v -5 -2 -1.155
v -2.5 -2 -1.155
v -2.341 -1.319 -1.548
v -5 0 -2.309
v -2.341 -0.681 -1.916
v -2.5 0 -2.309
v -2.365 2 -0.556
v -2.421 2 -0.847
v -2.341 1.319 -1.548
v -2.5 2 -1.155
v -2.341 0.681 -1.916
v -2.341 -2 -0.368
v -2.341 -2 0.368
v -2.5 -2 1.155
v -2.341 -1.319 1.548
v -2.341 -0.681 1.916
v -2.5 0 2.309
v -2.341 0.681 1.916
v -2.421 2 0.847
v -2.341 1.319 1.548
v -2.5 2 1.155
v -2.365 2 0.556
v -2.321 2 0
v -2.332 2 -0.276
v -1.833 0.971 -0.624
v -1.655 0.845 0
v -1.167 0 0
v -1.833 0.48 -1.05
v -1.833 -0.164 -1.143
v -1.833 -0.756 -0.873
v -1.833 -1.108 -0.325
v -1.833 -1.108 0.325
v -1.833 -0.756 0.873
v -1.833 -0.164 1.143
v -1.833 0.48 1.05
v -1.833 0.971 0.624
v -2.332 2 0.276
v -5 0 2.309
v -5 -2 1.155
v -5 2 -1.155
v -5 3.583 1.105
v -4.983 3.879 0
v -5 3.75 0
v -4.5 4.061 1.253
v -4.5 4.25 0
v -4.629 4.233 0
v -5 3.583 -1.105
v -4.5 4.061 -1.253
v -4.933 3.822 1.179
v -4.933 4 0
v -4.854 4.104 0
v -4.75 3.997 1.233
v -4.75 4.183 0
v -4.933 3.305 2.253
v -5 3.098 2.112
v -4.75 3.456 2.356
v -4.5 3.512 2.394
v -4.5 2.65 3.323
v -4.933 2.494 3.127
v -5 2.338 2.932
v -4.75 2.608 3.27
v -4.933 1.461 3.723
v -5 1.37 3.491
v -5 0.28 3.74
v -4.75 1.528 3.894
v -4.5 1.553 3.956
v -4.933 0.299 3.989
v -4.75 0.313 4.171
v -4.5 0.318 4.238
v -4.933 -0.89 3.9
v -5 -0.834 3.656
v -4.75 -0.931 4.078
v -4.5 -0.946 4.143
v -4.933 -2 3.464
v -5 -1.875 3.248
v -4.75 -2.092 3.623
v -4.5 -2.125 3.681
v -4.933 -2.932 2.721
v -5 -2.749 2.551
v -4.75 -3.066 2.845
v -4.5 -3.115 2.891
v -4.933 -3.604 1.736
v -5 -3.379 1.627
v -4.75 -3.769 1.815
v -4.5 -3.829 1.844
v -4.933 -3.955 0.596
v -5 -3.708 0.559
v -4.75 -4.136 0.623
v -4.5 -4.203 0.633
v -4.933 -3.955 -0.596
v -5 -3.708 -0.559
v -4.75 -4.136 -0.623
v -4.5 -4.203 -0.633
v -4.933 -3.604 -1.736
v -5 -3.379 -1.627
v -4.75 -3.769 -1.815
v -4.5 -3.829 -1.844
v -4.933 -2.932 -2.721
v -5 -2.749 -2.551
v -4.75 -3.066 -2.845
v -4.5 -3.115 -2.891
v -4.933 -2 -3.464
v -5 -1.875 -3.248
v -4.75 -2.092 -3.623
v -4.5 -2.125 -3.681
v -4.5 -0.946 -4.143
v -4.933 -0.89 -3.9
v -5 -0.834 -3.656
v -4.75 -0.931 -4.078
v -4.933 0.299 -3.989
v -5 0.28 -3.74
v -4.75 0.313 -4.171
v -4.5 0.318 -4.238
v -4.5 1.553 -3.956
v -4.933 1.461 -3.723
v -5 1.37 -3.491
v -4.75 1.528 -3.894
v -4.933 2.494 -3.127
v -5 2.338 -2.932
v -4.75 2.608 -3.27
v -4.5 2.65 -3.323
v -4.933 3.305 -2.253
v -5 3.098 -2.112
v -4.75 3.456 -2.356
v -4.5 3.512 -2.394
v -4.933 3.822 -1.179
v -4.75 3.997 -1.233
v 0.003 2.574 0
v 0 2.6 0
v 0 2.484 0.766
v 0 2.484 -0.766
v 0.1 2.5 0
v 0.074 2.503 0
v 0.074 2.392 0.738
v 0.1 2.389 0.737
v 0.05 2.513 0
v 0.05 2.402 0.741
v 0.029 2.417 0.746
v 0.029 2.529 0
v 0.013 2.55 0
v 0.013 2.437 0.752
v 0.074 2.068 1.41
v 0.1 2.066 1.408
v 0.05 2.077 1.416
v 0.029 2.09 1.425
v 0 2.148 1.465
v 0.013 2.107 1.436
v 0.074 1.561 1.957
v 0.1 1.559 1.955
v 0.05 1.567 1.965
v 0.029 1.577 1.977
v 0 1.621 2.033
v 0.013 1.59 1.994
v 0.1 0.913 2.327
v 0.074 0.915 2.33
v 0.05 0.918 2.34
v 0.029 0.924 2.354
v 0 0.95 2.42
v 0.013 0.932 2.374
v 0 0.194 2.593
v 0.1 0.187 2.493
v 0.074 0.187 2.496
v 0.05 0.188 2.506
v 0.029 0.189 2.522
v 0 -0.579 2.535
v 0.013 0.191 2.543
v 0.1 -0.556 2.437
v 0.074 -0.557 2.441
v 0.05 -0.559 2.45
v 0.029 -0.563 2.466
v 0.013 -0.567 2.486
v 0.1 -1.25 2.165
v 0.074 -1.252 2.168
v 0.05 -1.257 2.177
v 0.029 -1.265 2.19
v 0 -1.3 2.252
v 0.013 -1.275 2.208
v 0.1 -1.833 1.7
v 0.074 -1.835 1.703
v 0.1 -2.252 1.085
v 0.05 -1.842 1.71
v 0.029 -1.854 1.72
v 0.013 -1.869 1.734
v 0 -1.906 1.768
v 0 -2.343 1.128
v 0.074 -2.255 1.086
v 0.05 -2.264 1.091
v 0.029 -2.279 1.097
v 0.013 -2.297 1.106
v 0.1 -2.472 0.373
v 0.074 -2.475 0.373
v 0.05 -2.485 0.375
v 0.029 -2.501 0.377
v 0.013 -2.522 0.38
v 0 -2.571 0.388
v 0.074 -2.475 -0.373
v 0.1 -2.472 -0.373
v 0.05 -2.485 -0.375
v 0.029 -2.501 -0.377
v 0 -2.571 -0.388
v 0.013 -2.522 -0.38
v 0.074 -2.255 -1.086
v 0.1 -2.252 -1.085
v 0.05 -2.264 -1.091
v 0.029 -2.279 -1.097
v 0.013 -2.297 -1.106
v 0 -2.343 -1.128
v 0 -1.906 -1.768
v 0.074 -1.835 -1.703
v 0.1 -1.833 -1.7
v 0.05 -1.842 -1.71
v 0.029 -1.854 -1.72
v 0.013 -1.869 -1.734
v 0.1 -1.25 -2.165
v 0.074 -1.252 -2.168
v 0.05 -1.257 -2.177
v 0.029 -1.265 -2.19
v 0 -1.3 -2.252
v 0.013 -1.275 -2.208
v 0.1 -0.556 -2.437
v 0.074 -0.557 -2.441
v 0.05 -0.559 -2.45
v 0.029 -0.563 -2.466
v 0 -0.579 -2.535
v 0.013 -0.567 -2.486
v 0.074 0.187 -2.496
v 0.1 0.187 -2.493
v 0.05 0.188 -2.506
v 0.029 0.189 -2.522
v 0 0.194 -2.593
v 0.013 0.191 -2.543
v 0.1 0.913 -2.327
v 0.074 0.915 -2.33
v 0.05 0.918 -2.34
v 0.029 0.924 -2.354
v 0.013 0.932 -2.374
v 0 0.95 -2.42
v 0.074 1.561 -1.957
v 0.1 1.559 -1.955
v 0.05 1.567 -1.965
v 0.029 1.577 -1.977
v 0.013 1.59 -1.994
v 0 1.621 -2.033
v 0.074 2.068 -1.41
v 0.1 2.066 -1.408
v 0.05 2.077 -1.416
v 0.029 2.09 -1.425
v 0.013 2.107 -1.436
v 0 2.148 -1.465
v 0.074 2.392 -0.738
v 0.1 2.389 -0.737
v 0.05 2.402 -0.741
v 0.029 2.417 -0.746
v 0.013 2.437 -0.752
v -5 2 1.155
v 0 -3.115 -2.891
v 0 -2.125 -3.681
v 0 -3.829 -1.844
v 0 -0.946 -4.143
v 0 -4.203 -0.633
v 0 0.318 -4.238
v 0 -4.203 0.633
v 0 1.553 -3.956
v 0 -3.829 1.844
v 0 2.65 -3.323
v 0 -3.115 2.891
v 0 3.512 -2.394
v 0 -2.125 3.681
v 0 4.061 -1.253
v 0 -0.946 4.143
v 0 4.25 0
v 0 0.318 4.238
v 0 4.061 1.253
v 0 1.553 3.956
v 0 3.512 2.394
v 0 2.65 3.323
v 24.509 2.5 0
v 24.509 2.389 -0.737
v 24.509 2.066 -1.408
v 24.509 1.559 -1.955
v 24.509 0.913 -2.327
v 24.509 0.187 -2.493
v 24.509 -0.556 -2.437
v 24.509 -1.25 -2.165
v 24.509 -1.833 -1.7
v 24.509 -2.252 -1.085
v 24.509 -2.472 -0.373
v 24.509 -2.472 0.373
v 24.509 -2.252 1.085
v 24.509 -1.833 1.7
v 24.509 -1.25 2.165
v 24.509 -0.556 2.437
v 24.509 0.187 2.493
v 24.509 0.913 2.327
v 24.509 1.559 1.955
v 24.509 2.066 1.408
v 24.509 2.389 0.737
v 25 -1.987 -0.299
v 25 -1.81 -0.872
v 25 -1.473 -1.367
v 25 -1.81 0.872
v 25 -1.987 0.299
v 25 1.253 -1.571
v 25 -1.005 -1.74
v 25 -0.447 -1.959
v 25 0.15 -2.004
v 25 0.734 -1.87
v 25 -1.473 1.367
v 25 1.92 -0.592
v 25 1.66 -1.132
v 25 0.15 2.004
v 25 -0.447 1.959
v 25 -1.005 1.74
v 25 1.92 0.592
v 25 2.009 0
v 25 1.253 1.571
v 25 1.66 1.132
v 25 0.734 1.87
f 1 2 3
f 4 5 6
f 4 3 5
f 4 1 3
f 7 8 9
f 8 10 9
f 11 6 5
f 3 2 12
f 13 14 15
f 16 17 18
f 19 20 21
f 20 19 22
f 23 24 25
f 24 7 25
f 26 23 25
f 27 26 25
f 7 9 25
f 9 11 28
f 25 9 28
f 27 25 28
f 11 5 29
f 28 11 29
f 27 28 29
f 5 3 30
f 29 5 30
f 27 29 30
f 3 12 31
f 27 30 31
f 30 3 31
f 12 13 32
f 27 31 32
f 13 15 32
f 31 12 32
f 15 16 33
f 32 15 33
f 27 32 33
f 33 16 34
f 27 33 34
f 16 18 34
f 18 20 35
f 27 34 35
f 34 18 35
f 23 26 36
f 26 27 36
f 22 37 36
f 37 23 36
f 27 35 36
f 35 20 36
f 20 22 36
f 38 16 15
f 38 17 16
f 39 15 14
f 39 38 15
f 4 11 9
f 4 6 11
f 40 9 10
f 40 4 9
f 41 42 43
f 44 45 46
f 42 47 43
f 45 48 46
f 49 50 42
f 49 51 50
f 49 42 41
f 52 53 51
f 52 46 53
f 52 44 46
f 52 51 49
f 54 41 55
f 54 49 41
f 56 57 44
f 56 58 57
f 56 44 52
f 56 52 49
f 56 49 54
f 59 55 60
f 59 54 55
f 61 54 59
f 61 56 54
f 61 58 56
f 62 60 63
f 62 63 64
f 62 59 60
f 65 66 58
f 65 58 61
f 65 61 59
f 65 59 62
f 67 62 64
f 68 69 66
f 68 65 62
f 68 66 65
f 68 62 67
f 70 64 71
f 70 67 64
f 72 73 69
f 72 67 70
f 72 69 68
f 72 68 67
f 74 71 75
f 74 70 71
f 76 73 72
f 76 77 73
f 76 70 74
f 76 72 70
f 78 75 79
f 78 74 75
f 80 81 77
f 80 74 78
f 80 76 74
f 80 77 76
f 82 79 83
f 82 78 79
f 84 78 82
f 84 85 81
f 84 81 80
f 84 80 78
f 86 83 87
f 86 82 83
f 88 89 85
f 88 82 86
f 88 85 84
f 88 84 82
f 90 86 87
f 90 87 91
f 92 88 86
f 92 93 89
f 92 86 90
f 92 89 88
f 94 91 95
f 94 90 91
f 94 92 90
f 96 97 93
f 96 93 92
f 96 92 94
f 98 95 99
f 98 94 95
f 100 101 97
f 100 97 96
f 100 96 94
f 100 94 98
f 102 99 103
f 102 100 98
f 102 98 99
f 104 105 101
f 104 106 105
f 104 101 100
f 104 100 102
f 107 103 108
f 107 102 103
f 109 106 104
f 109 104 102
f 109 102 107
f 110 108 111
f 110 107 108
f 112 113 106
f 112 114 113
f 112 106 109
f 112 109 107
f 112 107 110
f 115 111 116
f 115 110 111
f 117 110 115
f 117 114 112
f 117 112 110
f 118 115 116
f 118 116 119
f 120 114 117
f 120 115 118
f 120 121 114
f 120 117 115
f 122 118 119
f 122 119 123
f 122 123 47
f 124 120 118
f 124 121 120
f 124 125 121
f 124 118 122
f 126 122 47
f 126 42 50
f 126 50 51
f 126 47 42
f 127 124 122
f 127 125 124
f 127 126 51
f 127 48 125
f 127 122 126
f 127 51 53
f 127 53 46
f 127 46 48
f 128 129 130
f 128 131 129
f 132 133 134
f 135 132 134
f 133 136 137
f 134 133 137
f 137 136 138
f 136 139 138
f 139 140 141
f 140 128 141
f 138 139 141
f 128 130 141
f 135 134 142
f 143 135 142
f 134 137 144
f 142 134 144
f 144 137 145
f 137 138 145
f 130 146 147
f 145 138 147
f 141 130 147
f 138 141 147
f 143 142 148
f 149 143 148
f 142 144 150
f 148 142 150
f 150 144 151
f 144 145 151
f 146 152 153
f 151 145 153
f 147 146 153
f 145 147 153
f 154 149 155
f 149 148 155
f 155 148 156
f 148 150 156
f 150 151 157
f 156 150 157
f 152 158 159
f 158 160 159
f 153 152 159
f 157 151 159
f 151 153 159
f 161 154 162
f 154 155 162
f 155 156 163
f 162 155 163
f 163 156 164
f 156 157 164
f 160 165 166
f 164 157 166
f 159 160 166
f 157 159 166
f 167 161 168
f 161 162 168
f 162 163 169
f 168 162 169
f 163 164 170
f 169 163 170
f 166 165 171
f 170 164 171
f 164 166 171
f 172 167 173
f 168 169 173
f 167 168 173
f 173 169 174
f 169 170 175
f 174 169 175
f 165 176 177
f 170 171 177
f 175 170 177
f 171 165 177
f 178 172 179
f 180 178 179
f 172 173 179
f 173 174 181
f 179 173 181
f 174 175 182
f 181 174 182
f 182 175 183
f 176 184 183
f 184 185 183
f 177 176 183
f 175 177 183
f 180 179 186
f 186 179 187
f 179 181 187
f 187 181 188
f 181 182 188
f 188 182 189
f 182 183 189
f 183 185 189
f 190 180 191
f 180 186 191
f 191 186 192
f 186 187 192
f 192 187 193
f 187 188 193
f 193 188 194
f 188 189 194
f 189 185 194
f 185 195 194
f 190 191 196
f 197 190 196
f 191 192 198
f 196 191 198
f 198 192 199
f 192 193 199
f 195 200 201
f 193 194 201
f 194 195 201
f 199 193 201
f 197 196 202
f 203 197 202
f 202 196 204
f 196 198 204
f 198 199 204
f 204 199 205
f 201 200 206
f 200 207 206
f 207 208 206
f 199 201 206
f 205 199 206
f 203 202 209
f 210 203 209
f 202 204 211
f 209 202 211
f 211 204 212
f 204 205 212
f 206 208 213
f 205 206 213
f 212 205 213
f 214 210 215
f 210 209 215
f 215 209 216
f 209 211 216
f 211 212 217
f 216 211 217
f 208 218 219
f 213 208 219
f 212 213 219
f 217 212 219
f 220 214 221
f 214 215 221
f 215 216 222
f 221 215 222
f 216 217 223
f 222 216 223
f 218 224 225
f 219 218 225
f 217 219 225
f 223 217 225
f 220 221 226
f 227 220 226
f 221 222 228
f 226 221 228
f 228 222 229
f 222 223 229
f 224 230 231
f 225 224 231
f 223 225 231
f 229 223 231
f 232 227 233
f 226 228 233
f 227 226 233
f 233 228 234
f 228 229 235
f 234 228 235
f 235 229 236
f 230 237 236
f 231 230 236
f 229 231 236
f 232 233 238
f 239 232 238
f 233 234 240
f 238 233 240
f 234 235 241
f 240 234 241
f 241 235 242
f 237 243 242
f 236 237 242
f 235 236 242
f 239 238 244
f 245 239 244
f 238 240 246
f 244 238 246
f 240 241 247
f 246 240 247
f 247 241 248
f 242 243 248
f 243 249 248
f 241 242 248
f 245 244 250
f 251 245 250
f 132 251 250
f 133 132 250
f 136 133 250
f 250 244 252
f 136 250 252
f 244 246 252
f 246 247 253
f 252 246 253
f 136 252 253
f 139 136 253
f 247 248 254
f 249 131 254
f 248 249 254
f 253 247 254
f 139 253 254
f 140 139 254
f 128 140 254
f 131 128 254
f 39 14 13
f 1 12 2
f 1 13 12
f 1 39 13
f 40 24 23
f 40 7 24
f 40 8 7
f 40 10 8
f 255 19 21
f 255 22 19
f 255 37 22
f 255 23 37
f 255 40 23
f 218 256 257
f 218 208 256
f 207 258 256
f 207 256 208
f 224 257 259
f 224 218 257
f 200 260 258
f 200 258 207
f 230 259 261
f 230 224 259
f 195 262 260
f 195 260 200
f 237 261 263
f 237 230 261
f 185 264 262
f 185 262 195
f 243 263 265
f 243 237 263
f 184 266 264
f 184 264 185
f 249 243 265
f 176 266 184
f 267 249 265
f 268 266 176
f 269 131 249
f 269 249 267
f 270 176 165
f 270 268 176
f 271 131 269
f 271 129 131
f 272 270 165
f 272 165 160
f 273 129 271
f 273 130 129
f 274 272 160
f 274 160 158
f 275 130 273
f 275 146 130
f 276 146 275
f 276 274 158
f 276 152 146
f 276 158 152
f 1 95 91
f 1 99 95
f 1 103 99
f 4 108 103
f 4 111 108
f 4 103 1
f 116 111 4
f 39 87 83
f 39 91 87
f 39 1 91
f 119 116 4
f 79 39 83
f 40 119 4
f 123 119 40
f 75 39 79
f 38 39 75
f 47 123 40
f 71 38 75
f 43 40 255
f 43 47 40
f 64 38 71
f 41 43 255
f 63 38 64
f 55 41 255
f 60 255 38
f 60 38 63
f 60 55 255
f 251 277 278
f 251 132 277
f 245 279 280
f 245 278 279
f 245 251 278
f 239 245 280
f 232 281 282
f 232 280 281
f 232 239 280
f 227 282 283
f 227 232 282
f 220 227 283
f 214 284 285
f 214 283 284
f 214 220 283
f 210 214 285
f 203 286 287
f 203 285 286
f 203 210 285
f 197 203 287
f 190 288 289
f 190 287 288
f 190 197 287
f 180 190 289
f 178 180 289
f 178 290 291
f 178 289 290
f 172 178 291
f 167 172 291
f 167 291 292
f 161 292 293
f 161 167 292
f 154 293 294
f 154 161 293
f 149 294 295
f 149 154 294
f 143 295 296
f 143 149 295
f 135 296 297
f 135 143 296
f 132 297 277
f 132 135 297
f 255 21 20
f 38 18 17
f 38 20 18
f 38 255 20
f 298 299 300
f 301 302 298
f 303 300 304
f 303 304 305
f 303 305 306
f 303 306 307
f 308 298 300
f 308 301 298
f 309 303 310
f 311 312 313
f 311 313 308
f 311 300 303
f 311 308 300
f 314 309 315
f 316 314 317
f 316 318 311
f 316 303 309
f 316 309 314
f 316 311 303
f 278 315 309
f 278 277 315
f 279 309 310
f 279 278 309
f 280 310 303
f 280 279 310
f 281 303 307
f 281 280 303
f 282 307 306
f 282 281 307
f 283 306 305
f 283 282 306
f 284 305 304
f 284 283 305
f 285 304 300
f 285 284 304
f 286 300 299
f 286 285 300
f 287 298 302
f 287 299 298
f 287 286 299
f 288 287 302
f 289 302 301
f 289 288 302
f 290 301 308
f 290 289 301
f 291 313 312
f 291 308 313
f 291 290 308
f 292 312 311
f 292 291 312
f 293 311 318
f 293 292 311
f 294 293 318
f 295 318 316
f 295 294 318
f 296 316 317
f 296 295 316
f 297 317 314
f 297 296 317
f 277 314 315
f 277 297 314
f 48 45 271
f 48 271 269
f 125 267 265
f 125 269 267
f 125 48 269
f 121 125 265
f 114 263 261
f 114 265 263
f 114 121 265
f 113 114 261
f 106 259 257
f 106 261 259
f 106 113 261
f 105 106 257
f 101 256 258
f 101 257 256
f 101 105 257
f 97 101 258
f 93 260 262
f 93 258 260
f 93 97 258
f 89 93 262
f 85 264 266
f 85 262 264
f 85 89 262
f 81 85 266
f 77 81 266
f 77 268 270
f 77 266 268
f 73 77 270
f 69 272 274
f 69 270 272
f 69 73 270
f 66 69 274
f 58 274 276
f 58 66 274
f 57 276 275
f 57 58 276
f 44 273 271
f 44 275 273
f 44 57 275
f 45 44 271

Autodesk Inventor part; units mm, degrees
ref_plane "YZ Plane" through (0, 0, 0) normal (1, 0, 0) x (0, 1, 0)
ref_plane "XZ Plane" through (0, 0, 0) normal (0, 1, 0) x (-1, 0, 0)
sketch "Sketch1" plane through (0, 0, 0) normal (0, 0, 1) x (1, 0, 0)
  line L0 (-1.1667, 0) -> (25, 0)
  line L1 (25, 0) -> (25, 2.5)
  line L2 (25, 2.5) -> (1.4815, 2.5)
  line L3 (1.4815, 2.5) -> (0.9907, 2.5)
  line L4 (0.9907, 2.5) -> (0, 2.5)
  line L5 (0, 2.5) -> (0, 4.25)
  line L6 (0, 4.25) -> (-5, 4.25)
  line L7 (-5, 4.25) -> (-5, 2.3094)
  line L8 (-5, 2.3094) -> (-2.5, 2.3094)
  line L9 (-2.5, 2.3094) -> (-1.1667, 0)
  line L10 (-11, 0) -> (31, 0) projected
  line L11 (0, -0.85) -> (0, 5.1) projected
  line L12 (1.4815, 2.5) -> (0, 2.5) construction
  dimension "d1" = 23.5185
  dimension "d2" = 0.4909
  dimension "d3" = 5
  dimension "d4" = 2.5
  dimension "d5" = 60
  dimension "d6" = 5
  dimension "d7" = 5
  dimension "d8" = 4.6188
  dimension "d9" = 8.5
  dimension "d26" = 25
revolve "Body" add sketch "Sketch1" angle 360 about axis through (-1.1667, 0, 0) along (1, 0, 0)
sketch "Sketch2" plane through (-5, 0, 0) normal (-1, 0, 0) x (0, 0, 1)
  circle A0 centre (0, 0) radius 2.3094 projected
  line L0 (0, -5.95) -> (0, 5.95) projected
  line L1 (-5.95, 0) -> (5.95, 0) projected
  line L2 (2.3094, 0) -> (1.1547, -2)
  line L3 (1.1547, -2) -> (-1.1547, -2)
  line L4 (-1.1547, -2) -> (-2.3094, 0)
  line L5 (-2.3094, 0) -> (-1.1547, 2)
  line L6 (-1.1547, 2) -> (1.1547, 2)
  line L7 (1.1547, 2) -> (2.3094, 0)
extrude "Slot" add sketch "Sketch2" against normal up to next contours L7 A0 | A0 L2 | L6 L0 A0 | A0 L0 L3 | L0 L6 A0 | A0 L3 L0 | L4 A0 | A0 L5
fillet "Fillet1" radius 0.5 1 edges at (-5, -4.25, 0)
thread "Thread" size "M5x0.8" class "6g" standard "ISO Metric profile" length 23.5185
chamfer "Chamfer1" distance 0.4908 distance2 0.4908 1 edges at (25, -2.5, 0) measured on face at (25, 0.6587, -0.3326)
ref_plane "Work Plane1" through (29, 0, 0) normal (0, -1, 0) x (1, 0, 0)
fillet "Fillet2" radius 0.1 1 edges at (0, -2.5, 0)
equation "\"d1\" = GEL"
equation "\"d3\" = KOH"
equation "\"d4\" = INTI"
equation "\"d6\" = GD"
equation "\"d7\" = BDM"
equation "\"d8\" = 1.1547 * SW"
equation "\"d9\" = KOD"
equation "\"d26\" = NLG"
equation "\"d30\" = R"
equation "\"d17\" = RR"
equation "\"d13\" = GEL"
equation "\"d15\" = -0.5 * SPD + 0.5 * GD"
equation "\"d16\" = GUL"
equation "\"GD\" = NND"
equation "\"NLG\" = 25"
equation "\"GEL\" = 23.51848"
equation "\"KOD\" = 8.5"
equation "\"KOH\" = 5"
equation "\"INTI\" = 2.5"
equation "\"GAL\" = 0.61345 * PTC"
equation "\"GUL\" = 0.61345 * PTC"
equation "\"BDM\" = NND"
equation "\"SW\" = 4"
equation "\"RR\" = 0.5"
equation "\"SPD\" = 4.01848"
equation "\"R\" = 0.1"
equation "\"TOA\" = 30deg"
equation "\"THREADDIA\" = 5"
equation "\"PTC\" = 0.8"
equation "\"NND\" = 5"
equation "\"E0\" = 1.155 * SW"
equation "\"GD1\" = THREADDIA - 1.2269 * PTC"
properties part number "ANSI B18.3.1M - M5x0.8 x 25" material "Steel, Mild"
